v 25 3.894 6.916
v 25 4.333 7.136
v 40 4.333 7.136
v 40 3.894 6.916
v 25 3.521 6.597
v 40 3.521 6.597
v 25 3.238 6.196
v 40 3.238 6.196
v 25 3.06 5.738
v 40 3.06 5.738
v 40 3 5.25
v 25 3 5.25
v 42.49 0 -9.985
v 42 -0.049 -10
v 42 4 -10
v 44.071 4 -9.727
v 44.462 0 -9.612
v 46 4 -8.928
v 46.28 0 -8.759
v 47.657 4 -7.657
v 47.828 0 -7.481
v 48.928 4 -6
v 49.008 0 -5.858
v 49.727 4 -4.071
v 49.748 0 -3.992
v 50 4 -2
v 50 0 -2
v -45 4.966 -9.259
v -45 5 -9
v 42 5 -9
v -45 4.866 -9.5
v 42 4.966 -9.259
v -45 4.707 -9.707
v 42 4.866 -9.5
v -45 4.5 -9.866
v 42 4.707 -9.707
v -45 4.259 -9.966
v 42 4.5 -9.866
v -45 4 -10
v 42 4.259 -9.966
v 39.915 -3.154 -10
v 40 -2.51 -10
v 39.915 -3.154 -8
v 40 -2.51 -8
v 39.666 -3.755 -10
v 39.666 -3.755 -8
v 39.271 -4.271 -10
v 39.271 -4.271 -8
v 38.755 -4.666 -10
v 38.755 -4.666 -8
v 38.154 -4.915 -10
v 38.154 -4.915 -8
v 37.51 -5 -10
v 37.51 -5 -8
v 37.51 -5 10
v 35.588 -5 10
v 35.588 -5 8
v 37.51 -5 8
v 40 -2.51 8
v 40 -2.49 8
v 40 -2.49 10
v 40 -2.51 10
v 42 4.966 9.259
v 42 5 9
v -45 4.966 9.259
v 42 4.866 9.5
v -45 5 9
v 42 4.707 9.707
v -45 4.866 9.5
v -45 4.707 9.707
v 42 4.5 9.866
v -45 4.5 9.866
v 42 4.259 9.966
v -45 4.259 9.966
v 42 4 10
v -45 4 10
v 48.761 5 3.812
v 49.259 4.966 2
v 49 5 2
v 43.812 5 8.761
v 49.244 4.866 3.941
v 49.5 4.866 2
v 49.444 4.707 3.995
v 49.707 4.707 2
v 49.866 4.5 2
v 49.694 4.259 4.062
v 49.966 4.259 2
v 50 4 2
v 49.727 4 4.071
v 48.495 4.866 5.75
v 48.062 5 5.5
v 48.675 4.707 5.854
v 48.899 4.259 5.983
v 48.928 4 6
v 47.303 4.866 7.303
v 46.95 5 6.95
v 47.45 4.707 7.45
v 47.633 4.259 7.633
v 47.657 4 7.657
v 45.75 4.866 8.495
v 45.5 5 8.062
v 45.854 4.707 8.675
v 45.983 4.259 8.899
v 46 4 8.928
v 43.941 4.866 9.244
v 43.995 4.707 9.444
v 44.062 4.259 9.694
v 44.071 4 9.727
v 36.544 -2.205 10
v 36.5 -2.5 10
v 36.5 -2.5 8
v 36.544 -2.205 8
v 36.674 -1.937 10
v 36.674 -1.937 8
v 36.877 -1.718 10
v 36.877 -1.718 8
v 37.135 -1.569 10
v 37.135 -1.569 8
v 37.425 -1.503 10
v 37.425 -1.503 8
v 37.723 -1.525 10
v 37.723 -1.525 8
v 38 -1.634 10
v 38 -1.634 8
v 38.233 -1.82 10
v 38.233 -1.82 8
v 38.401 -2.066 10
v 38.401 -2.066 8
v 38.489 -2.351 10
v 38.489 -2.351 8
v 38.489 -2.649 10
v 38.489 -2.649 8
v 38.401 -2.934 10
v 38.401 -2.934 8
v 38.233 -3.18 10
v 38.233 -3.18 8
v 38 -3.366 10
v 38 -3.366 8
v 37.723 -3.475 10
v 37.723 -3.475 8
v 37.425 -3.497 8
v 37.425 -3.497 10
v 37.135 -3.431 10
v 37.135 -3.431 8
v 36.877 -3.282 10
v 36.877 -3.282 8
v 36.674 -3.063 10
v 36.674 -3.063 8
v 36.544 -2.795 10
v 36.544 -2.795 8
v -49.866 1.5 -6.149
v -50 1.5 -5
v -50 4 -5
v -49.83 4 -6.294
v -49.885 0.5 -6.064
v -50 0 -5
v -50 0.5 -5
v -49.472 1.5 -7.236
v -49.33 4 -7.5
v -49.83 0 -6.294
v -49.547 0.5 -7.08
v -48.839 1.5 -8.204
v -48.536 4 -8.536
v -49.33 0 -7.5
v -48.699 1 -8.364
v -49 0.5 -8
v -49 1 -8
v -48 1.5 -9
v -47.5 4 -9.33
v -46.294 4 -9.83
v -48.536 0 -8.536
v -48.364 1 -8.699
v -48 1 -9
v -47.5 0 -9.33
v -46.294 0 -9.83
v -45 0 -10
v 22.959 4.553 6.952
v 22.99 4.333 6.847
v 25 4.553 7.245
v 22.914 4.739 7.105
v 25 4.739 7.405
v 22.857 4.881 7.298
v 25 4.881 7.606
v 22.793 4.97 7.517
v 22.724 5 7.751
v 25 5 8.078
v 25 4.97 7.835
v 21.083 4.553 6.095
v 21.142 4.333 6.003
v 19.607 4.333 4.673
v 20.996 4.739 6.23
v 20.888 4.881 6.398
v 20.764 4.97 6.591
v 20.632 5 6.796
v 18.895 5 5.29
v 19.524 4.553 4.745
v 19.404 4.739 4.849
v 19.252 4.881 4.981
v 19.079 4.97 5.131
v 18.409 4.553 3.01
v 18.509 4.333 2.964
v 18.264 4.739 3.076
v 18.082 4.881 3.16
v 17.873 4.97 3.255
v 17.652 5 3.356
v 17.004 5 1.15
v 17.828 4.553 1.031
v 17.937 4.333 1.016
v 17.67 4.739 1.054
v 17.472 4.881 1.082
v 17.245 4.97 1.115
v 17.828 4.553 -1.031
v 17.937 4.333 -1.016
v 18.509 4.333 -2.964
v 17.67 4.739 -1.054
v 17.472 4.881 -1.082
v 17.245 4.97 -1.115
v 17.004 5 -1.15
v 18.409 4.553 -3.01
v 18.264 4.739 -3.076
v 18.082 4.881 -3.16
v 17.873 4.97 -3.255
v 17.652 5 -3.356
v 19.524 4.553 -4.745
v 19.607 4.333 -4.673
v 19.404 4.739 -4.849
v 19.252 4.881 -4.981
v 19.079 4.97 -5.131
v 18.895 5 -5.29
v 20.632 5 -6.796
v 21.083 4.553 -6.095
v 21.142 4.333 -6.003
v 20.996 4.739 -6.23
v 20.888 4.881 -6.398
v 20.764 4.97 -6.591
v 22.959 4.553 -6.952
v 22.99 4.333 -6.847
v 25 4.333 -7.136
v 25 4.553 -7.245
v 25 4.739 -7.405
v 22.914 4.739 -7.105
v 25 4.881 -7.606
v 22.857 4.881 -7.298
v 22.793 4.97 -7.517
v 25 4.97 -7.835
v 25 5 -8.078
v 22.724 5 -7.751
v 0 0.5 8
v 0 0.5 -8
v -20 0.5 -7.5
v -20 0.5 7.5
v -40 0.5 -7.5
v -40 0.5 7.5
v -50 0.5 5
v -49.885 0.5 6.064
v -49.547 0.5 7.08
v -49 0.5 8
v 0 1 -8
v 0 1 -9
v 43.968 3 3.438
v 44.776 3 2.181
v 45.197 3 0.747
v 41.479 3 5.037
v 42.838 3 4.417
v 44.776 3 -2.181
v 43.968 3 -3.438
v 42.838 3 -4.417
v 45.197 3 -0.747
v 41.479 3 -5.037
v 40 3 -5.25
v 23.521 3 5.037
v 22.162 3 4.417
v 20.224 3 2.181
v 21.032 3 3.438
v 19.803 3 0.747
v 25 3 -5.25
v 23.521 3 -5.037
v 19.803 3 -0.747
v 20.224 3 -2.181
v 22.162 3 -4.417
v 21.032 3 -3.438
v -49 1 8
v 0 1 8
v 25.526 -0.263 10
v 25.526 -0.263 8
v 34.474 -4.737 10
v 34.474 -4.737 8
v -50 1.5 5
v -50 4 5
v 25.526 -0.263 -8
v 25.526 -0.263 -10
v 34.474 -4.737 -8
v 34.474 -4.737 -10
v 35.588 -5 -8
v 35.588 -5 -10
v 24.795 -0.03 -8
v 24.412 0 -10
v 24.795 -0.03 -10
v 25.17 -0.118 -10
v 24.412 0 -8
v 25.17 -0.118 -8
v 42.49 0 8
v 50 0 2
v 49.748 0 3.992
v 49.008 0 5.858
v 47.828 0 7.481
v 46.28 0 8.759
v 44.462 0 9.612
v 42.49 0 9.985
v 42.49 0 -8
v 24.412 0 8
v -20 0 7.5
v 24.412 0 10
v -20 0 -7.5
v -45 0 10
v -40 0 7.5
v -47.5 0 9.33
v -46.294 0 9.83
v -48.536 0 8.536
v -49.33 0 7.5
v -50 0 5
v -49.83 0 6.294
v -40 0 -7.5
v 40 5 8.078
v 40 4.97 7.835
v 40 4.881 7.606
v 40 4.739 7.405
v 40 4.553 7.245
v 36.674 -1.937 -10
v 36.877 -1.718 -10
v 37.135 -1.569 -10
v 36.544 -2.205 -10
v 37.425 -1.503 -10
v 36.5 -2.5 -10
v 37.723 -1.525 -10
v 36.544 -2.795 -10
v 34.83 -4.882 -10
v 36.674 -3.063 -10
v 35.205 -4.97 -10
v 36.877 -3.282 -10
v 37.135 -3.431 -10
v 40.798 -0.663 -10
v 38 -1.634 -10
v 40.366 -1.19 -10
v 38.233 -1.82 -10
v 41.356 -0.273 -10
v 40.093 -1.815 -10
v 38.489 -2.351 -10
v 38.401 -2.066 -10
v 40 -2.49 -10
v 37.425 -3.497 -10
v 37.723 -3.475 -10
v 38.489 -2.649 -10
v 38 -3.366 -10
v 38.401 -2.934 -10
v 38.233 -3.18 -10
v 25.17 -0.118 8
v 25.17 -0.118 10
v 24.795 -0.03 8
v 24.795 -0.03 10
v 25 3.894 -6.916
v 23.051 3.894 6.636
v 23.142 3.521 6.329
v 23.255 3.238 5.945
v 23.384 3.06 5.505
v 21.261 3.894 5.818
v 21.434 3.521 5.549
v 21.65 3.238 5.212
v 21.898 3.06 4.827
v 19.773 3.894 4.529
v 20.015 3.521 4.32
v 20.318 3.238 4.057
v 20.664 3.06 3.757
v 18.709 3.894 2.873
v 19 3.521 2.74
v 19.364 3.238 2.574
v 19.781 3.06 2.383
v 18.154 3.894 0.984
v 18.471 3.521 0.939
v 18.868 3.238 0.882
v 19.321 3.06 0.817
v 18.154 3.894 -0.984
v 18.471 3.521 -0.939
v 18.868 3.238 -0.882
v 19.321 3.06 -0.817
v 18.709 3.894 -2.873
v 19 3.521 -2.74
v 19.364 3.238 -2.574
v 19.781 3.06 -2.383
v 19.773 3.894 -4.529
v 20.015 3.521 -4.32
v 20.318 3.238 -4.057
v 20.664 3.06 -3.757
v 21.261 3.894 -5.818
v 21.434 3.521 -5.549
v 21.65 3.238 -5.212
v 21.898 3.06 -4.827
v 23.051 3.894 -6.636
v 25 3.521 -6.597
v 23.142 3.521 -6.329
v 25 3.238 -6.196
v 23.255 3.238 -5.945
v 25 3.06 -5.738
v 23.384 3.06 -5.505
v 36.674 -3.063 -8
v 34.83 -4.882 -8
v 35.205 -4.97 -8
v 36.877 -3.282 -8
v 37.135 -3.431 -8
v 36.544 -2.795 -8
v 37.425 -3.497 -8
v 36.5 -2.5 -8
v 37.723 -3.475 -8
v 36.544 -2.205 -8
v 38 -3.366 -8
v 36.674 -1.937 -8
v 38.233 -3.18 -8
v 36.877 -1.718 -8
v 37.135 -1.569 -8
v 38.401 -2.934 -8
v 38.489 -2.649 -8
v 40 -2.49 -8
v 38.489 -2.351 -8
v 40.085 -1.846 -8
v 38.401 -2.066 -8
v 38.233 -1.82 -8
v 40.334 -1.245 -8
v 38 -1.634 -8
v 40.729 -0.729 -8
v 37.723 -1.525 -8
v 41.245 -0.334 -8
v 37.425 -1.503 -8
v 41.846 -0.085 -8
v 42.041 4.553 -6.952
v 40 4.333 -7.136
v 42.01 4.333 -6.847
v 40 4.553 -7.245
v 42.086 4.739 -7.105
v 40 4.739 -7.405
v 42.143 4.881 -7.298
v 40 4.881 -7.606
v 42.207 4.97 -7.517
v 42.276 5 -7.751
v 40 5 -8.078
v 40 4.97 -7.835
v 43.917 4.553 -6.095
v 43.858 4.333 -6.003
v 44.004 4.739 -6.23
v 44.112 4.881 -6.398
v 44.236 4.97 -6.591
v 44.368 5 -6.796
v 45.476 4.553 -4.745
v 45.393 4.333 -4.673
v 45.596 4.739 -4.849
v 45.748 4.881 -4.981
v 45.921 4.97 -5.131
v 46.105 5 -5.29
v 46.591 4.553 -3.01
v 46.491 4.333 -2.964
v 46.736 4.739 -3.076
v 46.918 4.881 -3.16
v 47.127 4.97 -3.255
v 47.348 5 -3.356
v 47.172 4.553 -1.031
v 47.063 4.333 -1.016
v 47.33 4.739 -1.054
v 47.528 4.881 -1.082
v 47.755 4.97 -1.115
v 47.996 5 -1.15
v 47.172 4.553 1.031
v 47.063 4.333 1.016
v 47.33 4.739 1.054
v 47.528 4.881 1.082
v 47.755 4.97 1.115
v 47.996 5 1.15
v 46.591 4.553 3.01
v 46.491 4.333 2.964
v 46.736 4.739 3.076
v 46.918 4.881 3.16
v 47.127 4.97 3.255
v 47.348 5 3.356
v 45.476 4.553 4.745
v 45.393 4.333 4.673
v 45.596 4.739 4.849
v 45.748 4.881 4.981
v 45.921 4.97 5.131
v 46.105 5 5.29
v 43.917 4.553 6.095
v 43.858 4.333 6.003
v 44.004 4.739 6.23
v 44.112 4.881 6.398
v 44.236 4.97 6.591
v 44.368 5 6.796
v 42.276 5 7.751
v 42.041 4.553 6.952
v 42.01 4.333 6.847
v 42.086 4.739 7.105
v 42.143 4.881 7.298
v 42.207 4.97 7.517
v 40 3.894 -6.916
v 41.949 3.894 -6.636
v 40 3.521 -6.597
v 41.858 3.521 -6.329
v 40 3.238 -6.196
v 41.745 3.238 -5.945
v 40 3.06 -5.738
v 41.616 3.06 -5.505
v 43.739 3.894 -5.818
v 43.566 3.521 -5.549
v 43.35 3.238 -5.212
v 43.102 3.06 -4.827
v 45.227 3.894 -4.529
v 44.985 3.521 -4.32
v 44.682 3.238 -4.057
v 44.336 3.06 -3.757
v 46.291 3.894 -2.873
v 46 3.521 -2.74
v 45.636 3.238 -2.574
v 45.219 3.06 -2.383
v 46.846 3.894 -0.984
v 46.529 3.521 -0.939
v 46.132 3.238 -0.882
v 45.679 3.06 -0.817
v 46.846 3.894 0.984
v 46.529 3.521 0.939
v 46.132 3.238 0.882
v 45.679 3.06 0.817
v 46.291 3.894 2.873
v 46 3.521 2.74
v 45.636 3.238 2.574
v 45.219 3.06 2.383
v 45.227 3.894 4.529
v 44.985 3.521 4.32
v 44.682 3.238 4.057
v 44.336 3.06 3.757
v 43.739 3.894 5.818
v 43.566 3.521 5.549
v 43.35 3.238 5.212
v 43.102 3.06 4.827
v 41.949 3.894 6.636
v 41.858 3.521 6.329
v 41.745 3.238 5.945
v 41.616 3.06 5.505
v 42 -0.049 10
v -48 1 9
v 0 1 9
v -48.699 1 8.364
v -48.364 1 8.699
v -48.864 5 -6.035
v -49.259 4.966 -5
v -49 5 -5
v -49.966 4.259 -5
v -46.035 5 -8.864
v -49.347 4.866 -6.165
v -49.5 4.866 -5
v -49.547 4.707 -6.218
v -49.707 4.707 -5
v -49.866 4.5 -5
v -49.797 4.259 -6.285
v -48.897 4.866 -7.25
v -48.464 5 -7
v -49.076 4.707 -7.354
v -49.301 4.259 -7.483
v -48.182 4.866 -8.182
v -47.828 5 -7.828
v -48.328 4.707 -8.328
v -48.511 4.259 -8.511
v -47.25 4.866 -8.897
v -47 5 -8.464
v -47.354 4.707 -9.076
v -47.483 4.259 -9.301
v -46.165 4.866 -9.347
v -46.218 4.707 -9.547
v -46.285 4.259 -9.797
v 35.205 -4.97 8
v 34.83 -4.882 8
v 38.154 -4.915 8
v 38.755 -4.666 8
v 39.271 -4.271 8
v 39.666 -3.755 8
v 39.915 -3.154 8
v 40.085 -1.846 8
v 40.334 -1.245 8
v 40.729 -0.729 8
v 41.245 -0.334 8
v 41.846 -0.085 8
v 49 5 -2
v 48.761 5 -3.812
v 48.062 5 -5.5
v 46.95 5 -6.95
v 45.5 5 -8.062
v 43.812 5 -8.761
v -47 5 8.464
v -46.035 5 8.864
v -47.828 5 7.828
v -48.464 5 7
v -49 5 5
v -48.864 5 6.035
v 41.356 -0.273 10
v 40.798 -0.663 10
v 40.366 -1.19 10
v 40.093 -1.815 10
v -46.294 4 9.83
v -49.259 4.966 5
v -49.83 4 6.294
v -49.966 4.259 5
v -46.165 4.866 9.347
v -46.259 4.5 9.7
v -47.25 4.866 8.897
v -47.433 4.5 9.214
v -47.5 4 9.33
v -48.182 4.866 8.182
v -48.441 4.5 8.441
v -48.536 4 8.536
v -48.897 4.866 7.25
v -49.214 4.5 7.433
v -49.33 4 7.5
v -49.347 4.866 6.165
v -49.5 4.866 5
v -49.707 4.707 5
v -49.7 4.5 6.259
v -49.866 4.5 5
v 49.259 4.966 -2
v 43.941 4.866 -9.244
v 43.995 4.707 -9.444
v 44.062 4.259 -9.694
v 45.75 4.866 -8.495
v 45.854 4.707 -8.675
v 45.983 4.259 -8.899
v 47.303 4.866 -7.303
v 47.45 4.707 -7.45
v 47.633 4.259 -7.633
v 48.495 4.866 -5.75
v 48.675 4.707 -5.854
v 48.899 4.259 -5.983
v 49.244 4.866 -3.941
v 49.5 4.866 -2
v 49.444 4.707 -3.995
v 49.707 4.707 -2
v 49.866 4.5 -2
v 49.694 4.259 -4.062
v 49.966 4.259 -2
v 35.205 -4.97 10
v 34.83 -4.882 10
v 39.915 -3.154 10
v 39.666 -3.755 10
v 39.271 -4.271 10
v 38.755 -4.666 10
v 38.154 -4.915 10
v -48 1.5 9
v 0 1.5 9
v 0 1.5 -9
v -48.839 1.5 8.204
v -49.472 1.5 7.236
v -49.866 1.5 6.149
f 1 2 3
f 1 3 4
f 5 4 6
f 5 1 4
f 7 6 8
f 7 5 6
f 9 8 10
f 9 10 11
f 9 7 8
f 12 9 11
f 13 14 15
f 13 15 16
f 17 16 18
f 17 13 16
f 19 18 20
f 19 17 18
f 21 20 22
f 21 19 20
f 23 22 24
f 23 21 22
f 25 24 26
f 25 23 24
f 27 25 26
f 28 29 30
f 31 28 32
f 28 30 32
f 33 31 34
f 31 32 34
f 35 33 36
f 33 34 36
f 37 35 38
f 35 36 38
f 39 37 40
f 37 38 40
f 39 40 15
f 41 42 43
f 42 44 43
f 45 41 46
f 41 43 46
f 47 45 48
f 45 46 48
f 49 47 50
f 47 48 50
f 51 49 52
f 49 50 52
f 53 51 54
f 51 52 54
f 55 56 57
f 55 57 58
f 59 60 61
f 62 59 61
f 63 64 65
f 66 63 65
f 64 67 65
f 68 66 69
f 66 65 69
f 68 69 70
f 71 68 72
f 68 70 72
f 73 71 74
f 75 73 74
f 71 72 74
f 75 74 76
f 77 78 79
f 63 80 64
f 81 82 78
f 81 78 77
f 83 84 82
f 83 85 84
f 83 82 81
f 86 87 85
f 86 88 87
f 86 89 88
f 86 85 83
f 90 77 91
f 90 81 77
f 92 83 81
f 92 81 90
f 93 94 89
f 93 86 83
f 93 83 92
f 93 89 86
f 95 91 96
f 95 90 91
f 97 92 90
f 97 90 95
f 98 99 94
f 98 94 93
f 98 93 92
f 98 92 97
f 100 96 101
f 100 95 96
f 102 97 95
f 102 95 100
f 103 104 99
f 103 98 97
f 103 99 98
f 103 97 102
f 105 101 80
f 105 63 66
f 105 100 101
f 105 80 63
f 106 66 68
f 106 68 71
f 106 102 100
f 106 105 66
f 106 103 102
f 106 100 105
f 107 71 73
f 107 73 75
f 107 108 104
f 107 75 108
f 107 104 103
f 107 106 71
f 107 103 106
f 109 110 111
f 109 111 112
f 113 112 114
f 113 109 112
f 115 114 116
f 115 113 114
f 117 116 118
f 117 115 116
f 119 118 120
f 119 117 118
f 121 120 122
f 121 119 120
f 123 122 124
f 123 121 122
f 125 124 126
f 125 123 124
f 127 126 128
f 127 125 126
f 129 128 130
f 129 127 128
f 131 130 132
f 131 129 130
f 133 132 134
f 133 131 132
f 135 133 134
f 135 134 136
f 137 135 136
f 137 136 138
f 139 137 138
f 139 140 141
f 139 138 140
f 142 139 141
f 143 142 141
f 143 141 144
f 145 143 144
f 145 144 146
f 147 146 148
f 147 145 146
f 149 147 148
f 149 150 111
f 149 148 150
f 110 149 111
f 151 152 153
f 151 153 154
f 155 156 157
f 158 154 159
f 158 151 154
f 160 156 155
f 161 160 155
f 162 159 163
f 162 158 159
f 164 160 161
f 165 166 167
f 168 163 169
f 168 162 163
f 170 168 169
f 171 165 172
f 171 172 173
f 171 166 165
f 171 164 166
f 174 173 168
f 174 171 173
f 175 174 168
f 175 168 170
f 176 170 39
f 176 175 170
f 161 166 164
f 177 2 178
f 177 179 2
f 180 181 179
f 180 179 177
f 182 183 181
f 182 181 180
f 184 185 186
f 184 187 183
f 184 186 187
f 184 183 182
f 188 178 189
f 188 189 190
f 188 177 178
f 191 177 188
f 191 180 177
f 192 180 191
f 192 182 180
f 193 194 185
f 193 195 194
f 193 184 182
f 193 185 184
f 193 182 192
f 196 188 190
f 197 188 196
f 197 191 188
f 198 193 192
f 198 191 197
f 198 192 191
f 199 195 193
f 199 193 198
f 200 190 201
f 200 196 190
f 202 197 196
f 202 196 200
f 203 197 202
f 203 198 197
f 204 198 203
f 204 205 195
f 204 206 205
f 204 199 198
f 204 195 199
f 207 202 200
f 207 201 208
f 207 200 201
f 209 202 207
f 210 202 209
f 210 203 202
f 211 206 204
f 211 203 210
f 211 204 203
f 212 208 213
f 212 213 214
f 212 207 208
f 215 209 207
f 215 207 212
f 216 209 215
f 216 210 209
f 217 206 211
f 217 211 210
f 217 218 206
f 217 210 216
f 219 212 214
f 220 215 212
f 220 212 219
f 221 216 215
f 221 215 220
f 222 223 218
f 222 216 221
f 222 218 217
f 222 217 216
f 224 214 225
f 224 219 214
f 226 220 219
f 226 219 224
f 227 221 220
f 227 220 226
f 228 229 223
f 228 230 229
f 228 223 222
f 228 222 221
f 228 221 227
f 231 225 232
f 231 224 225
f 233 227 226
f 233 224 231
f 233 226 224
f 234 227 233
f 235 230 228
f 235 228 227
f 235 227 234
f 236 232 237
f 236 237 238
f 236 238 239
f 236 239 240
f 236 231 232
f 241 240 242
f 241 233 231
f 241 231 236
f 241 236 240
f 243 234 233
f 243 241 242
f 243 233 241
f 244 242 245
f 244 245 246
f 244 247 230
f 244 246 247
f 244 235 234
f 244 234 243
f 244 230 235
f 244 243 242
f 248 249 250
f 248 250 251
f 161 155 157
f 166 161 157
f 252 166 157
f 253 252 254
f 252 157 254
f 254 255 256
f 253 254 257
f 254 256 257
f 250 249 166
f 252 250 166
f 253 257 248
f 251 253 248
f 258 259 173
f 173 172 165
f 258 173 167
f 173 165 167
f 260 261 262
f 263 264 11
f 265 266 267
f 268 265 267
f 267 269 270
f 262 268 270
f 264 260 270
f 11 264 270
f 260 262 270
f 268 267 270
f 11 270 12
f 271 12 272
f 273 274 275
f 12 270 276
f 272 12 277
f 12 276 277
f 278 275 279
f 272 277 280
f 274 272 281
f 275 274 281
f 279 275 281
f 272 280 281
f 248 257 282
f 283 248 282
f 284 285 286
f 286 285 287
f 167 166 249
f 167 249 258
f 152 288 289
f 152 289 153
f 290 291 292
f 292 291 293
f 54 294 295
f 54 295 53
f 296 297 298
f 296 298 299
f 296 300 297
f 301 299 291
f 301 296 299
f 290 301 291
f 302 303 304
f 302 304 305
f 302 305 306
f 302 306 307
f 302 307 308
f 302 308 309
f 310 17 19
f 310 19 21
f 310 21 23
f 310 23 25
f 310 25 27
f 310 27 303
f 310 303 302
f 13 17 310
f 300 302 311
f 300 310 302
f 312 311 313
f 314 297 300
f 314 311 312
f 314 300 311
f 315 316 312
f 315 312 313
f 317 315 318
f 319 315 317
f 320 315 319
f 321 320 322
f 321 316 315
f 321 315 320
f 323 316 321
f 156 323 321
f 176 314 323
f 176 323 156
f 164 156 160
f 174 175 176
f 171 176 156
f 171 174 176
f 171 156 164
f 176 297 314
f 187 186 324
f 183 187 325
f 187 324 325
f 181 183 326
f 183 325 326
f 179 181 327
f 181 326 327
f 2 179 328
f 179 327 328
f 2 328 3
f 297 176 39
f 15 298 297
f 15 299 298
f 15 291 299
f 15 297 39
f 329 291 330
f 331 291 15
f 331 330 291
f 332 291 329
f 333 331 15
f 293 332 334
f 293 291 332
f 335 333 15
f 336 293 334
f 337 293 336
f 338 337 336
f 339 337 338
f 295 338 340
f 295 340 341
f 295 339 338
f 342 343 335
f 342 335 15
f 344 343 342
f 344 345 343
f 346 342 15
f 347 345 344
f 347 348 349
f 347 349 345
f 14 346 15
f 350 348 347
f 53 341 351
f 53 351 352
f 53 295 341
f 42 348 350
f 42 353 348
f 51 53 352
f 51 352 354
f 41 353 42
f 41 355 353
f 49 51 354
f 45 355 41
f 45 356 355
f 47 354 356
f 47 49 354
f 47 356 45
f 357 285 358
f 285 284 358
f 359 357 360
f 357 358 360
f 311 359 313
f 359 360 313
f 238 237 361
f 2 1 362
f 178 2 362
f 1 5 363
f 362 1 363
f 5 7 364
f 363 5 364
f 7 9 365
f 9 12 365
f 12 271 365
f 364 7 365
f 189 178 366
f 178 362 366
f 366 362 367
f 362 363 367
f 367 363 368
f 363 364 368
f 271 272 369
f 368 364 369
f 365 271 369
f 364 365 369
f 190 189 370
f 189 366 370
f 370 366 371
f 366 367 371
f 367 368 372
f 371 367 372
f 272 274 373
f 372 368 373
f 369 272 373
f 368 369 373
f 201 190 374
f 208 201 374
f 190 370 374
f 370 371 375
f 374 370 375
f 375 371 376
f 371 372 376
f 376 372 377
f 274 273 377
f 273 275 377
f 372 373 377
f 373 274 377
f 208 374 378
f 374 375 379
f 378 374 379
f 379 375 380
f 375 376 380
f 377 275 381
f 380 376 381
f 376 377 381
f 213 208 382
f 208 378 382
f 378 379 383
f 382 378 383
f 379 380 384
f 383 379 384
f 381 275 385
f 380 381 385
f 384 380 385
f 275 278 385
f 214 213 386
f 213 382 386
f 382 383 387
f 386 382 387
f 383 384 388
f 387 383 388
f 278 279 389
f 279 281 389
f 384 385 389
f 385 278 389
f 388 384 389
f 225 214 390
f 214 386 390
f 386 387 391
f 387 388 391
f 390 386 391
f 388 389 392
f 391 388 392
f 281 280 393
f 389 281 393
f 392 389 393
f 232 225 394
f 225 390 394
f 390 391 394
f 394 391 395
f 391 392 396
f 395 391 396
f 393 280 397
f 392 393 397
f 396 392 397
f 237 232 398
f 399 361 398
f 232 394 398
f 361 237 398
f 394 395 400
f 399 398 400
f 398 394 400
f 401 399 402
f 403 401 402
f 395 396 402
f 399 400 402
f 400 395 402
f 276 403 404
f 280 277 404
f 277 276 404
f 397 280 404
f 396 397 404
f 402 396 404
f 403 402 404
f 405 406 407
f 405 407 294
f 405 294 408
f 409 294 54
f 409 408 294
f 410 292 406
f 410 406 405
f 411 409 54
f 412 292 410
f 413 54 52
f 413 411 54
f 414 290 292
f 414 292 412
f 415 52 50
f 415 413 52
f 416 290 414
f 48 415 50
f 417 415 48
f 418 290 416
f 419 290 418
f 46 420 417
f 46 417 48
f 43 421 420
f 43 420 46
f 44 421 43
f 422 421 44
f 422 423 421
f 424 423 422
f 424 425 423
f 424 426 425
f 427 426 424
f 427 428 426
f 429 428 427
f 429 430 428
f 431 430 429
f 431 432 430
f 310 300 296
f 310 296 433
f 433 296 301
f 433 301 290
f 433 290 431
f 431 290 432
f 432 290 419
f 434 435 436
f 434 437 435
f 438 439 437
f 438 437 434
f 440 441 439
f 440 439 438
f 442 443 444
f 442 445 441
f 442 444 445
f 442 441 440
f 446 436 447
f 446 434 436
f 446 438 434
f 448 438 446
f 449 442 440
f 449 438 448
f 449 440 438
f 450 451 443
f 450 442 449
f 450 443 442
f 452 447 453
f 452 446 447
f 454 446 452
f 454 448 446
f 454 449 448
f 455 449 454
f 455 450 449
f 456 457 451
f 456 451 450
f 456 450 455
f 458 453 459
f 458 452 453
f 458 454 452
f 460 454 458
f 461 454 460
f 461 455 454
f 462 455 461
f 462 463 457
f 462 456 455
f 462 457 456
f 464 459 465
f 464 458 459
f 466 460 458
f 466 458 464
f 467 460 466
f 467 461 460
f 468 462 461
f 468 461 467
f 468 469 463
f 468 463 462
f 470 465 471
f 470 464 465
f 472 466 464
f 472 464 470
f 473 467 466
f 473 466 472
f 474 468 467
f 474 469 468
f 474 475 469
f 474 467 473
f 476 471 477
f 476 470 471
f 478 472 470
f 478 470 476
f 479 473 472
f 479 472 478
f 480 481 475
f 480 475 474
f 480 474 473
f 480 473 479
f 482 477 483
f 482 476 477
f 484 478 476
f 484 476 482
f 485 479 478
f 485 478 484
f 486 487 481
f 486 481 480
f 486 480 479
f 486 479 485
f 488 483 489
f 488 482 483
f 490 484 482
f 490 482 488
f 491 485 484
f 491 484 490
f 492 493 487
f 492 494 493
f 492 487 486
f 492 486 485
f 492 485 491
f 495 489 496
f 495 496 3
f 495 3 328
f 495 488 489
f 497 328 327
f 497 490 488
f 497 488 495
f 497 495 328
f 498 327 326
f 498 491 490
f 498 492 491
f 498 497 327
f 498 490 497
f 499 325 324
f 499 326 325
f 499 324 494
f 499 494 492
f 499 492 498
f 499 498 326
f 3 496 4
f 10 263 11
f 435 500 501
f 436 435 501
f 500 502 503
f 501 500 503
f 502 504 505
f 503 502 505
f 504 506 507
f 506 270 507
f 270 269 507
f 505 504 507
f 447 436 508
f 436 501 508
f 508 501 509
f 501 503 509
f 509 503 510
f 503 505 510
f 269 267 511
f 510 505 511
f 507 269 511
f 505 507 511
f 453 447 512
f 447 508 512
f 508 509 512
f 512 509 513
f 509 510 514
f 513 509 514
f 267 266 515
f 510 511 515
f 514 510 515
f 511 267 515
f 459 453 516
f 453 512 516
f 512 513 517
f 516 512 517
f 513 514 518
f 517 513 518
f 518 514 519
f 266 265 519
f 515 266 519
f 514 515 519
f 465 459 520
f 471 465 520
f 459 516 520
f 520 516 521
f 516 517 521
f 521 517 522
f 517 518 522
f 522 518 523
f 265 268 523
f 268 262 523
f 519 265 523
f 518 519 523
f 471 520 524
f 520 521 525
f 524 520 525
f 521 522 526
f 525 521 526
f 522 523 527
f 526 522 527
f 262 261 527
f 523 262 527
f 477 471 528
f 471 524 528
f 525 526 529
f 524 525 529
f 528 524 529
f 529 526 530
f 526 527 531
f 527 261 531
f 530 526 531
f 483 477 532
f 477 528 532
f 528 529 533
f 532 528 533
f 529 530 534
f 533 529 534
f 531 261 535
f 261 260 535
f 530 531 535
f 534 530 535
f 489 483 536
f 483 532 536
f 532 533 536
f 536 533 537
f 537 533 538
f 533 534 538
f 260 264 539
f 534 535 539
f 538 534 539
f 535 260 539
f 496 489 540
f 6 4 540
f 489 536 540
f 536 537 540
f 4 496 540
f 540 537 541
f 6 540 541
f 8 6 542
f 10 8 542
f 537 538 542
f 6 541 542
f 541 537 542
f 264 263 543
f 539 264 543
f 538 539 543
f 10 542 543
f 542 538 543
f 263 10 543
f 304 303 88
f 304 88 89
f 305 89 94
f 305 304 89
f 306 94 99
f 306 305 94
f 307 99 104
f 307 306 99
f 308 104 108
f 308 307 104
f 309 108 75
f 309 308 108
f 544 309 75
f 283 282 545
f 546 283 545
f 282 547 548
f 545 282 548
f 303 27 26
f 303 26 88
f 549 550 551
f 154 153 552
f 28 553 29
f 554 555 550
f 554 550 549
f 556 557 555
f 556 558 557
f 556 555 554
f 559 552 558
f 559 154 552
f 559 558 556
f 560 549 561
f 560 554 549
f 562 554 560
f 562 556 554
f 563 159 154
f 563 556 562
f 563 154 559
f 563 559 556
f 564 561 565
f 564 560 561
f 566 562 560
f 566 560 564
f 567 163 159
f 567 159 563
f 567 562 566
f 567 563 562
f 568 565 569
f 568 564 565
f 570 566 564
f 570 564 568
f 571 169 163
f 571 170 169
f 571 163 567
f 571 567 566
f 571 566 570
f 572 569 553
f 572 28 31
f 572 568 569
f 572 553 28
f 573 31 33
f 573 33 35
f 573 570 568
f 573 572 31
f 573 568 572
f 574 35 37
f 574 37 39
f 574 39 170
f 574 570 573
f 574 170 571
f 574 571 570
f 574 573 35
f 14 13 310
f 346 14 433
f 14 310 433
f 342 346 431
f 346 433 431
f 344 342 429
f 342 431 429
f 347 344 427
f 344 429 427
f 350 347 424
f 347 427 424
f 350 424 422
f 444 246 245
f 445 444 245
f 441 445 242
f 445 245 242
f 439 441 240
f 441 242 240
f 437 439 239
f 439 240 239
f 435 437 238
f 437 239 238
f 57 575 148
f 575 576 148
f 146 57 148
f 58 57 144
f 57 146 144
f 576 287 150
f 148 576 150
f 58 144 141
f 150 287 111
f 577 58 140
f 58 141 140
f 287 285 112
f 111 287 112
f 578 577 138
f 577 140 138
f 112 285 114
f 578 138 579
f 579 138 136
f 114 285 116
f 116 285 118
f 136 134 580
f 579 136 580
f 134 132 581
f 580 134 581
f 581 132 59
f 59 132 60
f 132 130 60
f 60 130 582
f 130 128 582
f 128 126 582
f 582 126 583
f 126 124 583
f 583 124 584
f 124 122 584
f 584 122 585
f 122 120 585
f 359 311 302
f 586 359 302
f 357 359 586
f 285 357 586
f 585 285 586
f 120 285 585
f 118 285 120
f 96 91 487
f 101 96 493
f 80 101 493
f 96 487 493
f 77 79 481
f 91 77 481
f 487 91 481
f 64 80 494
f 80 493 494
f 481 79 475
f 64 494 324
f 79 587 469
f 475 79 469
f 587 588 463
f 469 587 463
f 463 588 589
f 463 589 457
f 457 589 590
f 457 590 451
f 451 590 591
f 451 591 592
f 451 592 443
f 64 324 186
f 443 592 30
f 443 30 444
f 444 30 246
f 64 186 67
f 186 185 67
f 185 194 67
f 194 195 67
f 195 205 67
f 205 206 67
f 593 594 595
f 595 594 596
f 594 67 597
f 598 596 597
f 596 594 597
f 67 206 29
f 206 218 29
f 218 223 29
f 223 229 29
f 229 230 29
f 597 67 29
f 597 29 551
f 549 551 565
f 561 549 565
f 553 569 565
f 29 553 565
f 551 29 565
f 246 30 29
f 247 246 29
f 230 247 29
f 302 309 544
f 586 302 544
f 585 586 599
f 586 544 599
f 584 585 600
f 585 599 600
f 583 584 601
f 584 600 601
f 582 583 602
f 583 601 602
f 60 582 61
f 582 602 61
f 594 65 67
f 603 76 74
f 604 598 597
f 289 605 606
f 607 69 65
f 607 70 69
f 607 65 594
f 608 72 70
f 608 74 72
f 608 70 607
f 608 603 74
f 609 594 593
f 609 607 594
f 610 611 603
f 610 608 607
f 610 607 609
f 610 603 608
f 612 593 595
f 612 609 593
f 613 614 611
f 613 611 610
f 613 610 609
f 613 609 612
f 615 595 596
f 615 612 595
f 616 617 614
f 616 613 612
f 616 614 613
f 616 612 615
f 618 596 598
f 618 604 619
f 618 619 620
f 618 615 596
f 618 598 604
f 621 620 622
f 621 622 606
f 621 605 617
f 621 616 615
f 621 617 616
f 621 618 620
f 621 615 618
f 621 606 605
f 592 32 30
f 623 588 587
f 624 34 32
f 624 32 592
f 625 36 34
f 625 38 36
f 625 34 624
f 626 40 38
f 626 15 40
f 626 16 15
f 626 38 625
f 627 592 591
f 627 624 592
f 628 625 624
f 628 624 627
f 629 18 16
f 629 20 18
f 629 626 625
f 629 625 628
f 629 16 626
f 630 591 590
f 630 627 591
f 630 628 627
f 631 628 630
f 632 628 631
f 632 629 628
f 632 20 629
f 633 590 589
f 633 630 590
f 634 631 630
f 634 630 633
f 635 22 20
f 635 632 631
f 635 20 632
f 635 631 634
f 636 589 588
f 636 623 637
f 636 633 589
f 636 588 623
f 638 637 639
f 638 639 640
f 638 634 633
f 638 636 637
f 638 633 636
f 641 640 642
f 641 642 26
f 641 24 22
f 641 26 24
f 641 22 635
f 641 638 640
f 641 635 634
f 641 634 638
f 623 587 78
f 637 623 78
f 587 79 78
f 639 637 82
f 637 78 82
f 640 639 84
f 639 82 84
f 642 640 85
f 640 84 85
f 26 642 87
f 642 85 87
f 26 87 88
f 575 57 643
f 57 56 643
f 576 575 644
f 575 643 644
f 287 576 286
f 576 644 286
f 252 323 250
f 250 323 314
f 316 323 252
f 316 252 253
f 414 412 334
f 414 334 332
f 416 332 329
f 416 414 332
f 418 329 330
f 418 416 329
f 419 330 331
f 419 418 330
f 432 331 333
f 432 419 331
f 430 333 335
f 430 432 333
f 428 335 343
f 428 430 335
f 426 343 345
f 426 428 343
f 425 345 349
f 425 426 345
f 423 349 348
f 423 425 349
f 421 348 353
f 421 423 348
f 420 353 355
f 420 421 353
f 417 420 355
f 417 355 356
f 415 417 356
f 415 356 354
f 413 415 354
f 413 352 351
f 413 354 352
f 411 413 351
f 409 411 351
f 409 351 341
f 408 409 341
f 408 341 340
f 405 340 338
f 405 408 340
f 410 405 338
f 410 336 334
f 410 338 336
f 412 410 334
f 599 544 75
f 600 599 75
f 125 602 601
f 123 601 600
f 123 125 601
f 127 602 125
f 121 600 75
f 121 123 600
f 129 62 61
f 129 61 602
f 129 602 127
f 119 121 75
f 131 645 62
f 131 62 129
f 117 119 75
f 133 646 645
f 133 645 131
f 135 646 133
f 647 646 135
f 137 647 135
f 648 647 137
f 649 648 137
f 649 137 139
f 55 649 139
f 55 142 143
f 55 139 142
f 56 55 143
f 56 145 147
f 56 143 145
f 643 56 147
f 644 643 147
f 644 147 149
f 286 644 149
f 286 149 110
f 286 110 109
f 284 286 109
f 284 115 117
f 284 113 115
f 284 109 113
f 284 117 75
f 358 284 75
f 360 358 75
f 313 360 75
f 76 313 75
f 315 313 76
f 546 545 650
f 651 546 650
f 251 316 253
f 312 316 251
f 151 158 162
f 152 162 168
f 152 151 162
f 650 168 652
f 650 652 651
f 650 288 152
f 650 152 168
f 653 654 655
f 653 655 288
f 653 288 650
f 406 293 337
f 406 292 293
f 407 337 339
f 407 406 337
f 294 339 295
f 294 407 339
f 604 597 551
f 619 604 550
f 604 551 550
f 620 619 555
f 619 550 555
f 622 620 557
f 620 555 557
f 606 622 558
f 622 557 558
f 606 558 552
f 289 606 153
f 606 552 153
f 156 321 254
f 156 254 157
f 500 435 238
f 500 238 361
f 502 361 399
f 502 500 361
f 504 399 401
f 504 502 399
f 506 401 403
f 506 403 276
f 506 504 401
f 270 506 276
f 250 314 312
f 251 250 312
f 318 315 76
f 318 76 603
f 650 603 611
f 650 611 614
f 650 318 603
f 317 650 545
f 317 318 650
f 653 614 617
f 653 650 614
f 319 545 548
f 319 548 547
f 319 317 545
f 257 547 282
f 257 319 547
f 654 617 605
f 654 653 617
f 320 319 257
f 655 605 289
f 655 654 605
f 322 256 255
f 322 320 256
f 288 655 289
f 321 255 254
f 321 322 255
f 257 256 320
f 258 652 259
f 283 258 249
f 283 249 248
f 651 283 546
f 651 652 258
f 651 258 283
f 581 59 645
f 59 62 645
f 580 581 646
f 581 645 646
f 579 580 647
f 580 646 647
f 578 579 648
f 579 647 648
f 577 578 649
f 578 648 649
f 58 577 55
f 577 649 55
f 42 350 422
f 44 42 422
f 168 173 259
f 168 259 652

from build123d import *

# Parameters (mm, degrees)
BOSS_EXTRUDE1_DEPTH     = 5
CUT_EXTRUDE2_DEPTH      = 2
FILLET1_R               = 2
FILLET2_R               = 1
SKETCH8_W               = 18
SKETCH8_H               = 0.5
SKETCH8_W_2             = 16
CUT_EXTRUDE3_DEPTH      = 50
FILLET3_R               = 1
SKETCH9_W               = 20
SKETCH9_H               = 15
CUT_EXTRUDE4_DEPTH      = 1
SKETCH10_W              = 15
SKETCH10_H              = 2
BOSS_EXTRUDE2_DEPTH     = 5
FILLET4_R               = 2.49
CUT_EXTRUDE5_DEPTH      = 55.083269261
CUT_EXTRUDE5_DEPTH_BACK = 55.083269261
FILLET5_R               = 2.49
CUT_EXTRUDE6_DEPTH      = 55.083269261
CUT_EXTRUDE6_DEPTH_BACK = 55.083269261
SKETCH13_R              = 1


# Some blends are built 0.0001 mm under size
with BuildPart() as part:
    # Sketch2 → Boss-Extrude1 (new body)
    with BuildSketch(Plane(origin=(0, 0, 0), x_dir=(1, 0, 0), z_dir=(0, 1, 0))):
        with BuildLine():
            Line((-45, 10), (42, 10))
            ThreePointArc((42, 10), (47.656854249, 7.656854249), (50, 2))
            Line((50, 2), (50, -2))
            ThreePointArc((50, -2), (47.656854249, -7.656854249), (42, -10))
            Line((42, -10), (-45, -10))
            ThreePointArc((-45, -10), (-48.535533906, -8.535533906), (-50, -5))
            Line((-50, -5), (-50, 5))
            ThreePointArc((-50, 5), (-48.535533906, 8.535533906), (-45, 10))
        make_face()
    extrude(amount=BOSS_EXTRUDE1_DEPTH)

    # Sketch7 → Cut-Extrude2 (cut)
    with BuildSketch(Plane(origin=(0, 5, 0), x_dir=(1, 0, 0), z_dir=(0, 1, 0))):
        with BuildLine():
            Line((25, 7.25), (40, 7.25))
            ThreePointArc((40, 7.25), (47.25, 0), (40, -7.25))
            Line((40, -7.25), (25, -7.25))
            ThreePointArc((25, -7.25), (17.75, 0), (25, 7.25))
        make_face()
    extrude(amount=-CUT_EXTRUDE2_DEPTH, mode=Mode.SUBTRACT)

    # Fillet1
    fillet1_edges = [part.edges().sort_by_distance(p)[0] for p in [
        (32.5, 3, 7.25),
        (17.75, 3, 0),
        (47.25, 3, 0),
        (32.5, 3, -7.25),
    ]]
    fillet(fillet1_edges, radius=FILLET1_R - 0.0001)  # a hair under: the kernel refuses the full size

    # Fillet2
    # the kernel refuses this fillet: 1 mm, written as the material it takes off along each edge
    with BuildSketch(Plane(origin=(25, 5, 0), x_dir=(0, 0, 1), z_dir=(1, 0, 0))) as fillet2_piece_1:
        with BuildLine():
            CenterArc((8.078456413, 1), FILLET2_R, 199.469870121, 70.53012988)
            Line((8.078456413, 0), (8.078456413, -0.1))
            Line((8.078456413, -0.1), (7.25, -0.1))
            Line((7.25, -0.1), (7.15, 0))
            ThreePointArc((7.15, 0), (7.15, 0.0001), (7.041357825, 0.633357779))
            Line((7.041357825, 0.633357779), (7.135639515, 0.66668889))
        make_face()
    revolve(axis=Axis((25, 5, 0), (0, -1, 0)), revolution_arc=180, mode=Mode.SUBTRACT)
    with BuildSketch(Plane(origin=(40, 5, 7.25), x_dir=(0, 0, 1), z_dir=(-1, 0, 0))) as fillet2_piece_2:
        with BuildLine():
            CenterArc((0.828456413, -1), FILLET2_R, 90, 70.530129879)
            Line((-0.114360485, -0.66668889), (-0.208642175, -0.633357779))
            ThreePointArc((-0.208642175, -0.633357779), (-0.1, -0.0001), (-0.1, 0))
            Line((-0.1, 0), (0, 0.1))
            Line((0, 0.1), (0.828456413, 0.1))
            Line((0.828456413, 0.1), (0.828456413, 0))
        make_face()
    extrude(amount=15, mode=Mode.SUBTRACT)
    with BuildSketch(Plane(origin=(40, 5, 0), x_dir=(0, 0, -1), z_dir=(-1, 0, 0))) as fillet2_piece_3:
        with BuildLine():
            CenterArc((8.078456413, 1), FILLET2_R, 199.469870121, 70.530129879)
            Line((7.135639515, 0.66668889), (7.041357825, 0.633357779))
            ThreePointArc((7.041357825, 0.633357779), (7.15, 0.0001), (7.15, 0))
            Line((7.15, 0), (7.25, -0.1))
            Line((7.25, -0.1), (8.078456413, -0.1))
            Line((8.078456413, -0.1), (8.078456413, 0))
        make_face()
    revolve(axis=Axis((40, 5, 0), (0, -1, 0)), revolution_arc=180, mode=Mode.SUBTRACT)
    with BuildSketch(Plane(origin=(25, 5, -7.25), x_dir=(0, -0.9856047790757024, 0.16906572527610647), z_dir=(1, 0, 0))) as fillet2_piece_4:
        with BuildLine():
            CenterArc((0.845541195, 0.985596325), FILLET2_R, 189.733502803, 70.53012988)
            Line((-0.140063584, 0.8165306), (-0.238624062, 0.799624028))
            Line((-0.238624062, 0.799624028), (-0.098560478, -0.016906573))
            Line((-0.098560478, -0.016906573), (0.016906573, -0.098560478))
            ThreePointArc((0.016906573, -0.098560478), (0.017005133, -0.098543571), (0.659514694, -0.098559633))
            Line((0.659514694, -0.098559633), (0.676426194, 0))
        make_face()
    extrude(amount=15, mode=Mode.SUBTRACT)

    # Sketch8 → Cut-Extrude3 (cut)
    with BuildSketch(Plane.ZY.offset(50)):
        with Locations((0, 1.25)):
            Rectangle(SKETCH8_W, SKETCH8_H)
        with Locations((0, 0.75)):
            Rectangle(SKETCH8_W_2, SKETCH8_H)
    extrude(amount=-CUT_EXTRUDE3_DEPTH, mode=Mode.SUBTRACT)

    # Fillet3
    fillet3_edges = [part.edges().sort_by_distance(p)[0] for p in [
        (-48.535533906, 5, 8.535533906),
        (-1.5, 5, 10),
        (47.656854249, 5, 7.656854249),
        (50, 5, 0),
        (47.656854249, 5, -7.656854249),
        (-1.5, 5, -10),
        (-48.535533906, 5, -8.535533906),
        (-50, 5, 0),
    ]]
    fillet(fillet3_edges, radius=FILLET3_R)

    # Sketch9 → Cut-Extrude4 (cut)
    with BuildSketch(Plane.XZ):
        with Locations((-30, 0)):
            Rectangle(SKETCH9_W, SKETCH9_H)
    extrude(amount=-CUT_EXTRUDE4_DEPTH, mode=Mode.SUBTRACT)

    # Sketch10 → Boss-Extrude2 (add)
    with BuildSketch(Plane.XZ):
        with Locations((32.5, 9)):
            Rectangle(SKETCH10_W, SKETCH10_H)
        with Locations((32.5, -9)):
            Rectangle(SKETCH10_W, SKETCH10_H)
    extrude(amount=BOSS_EXTRUDE2_DEPTH)

    # Fillet4
    fillet4_edges = [part.edges().sort_by_distance(p)[0] for p in [
        (40, -5, -9),
        (40, 0, -9),
        (40, -5, 9),
        (40, 0, 9),
    ]]
    fillet(fillet4_edges, radius=FILLET4_R)

    # Sketch12 → Cut-Extrude5 (cut, two sides: drawn at the far end of the back side and taken through both)
    with BuildSketch(Plane.XY.offset(10).offset(-CUT_EXTRUDE5_DEPTH_BACK)):
        Polygon((25, 0), (35, -5), (35, -11.867947074), (25, -11.867947074), align=None)
    extrude(amount=CUT_EXTRUDE5_DEPTH + CUT_EXTRUDE5_DEPTH_BACK, mode=Mode.SUBTRACT)

    # Fillet5
    fillet5_edges = [part.edges().sort_by_distance(p)[0] for p in [
        (25, 0, 9),
        (25, 0, -9),
        (35, -5, -9),
        (35, -5, 9),
    ]]
    fillet(fillet5_edges, radius=FILLET5_R)

    # Sketch13 → Cut-Extrude6 (cut, two sides: drawn at the far end of the back side and taken through both)
    with BuildSketch(Plane(origin=(0, 0, -10), x_dir=(-1, 0, 0), z_dir=(0, 0, -1)).offset(-CUT_EXTRUDE6_DEPTH_BACK)):
        with Locations((-37.5, -2.5)):
            Circle(SKETCH13_R)
    extrude(amount=CUT_EXTRUDE6_DEPTH + CUT_EXTRUDE6_DEPTH_BACK, mode=Mode.SUBTRACT)


solid = part.part
